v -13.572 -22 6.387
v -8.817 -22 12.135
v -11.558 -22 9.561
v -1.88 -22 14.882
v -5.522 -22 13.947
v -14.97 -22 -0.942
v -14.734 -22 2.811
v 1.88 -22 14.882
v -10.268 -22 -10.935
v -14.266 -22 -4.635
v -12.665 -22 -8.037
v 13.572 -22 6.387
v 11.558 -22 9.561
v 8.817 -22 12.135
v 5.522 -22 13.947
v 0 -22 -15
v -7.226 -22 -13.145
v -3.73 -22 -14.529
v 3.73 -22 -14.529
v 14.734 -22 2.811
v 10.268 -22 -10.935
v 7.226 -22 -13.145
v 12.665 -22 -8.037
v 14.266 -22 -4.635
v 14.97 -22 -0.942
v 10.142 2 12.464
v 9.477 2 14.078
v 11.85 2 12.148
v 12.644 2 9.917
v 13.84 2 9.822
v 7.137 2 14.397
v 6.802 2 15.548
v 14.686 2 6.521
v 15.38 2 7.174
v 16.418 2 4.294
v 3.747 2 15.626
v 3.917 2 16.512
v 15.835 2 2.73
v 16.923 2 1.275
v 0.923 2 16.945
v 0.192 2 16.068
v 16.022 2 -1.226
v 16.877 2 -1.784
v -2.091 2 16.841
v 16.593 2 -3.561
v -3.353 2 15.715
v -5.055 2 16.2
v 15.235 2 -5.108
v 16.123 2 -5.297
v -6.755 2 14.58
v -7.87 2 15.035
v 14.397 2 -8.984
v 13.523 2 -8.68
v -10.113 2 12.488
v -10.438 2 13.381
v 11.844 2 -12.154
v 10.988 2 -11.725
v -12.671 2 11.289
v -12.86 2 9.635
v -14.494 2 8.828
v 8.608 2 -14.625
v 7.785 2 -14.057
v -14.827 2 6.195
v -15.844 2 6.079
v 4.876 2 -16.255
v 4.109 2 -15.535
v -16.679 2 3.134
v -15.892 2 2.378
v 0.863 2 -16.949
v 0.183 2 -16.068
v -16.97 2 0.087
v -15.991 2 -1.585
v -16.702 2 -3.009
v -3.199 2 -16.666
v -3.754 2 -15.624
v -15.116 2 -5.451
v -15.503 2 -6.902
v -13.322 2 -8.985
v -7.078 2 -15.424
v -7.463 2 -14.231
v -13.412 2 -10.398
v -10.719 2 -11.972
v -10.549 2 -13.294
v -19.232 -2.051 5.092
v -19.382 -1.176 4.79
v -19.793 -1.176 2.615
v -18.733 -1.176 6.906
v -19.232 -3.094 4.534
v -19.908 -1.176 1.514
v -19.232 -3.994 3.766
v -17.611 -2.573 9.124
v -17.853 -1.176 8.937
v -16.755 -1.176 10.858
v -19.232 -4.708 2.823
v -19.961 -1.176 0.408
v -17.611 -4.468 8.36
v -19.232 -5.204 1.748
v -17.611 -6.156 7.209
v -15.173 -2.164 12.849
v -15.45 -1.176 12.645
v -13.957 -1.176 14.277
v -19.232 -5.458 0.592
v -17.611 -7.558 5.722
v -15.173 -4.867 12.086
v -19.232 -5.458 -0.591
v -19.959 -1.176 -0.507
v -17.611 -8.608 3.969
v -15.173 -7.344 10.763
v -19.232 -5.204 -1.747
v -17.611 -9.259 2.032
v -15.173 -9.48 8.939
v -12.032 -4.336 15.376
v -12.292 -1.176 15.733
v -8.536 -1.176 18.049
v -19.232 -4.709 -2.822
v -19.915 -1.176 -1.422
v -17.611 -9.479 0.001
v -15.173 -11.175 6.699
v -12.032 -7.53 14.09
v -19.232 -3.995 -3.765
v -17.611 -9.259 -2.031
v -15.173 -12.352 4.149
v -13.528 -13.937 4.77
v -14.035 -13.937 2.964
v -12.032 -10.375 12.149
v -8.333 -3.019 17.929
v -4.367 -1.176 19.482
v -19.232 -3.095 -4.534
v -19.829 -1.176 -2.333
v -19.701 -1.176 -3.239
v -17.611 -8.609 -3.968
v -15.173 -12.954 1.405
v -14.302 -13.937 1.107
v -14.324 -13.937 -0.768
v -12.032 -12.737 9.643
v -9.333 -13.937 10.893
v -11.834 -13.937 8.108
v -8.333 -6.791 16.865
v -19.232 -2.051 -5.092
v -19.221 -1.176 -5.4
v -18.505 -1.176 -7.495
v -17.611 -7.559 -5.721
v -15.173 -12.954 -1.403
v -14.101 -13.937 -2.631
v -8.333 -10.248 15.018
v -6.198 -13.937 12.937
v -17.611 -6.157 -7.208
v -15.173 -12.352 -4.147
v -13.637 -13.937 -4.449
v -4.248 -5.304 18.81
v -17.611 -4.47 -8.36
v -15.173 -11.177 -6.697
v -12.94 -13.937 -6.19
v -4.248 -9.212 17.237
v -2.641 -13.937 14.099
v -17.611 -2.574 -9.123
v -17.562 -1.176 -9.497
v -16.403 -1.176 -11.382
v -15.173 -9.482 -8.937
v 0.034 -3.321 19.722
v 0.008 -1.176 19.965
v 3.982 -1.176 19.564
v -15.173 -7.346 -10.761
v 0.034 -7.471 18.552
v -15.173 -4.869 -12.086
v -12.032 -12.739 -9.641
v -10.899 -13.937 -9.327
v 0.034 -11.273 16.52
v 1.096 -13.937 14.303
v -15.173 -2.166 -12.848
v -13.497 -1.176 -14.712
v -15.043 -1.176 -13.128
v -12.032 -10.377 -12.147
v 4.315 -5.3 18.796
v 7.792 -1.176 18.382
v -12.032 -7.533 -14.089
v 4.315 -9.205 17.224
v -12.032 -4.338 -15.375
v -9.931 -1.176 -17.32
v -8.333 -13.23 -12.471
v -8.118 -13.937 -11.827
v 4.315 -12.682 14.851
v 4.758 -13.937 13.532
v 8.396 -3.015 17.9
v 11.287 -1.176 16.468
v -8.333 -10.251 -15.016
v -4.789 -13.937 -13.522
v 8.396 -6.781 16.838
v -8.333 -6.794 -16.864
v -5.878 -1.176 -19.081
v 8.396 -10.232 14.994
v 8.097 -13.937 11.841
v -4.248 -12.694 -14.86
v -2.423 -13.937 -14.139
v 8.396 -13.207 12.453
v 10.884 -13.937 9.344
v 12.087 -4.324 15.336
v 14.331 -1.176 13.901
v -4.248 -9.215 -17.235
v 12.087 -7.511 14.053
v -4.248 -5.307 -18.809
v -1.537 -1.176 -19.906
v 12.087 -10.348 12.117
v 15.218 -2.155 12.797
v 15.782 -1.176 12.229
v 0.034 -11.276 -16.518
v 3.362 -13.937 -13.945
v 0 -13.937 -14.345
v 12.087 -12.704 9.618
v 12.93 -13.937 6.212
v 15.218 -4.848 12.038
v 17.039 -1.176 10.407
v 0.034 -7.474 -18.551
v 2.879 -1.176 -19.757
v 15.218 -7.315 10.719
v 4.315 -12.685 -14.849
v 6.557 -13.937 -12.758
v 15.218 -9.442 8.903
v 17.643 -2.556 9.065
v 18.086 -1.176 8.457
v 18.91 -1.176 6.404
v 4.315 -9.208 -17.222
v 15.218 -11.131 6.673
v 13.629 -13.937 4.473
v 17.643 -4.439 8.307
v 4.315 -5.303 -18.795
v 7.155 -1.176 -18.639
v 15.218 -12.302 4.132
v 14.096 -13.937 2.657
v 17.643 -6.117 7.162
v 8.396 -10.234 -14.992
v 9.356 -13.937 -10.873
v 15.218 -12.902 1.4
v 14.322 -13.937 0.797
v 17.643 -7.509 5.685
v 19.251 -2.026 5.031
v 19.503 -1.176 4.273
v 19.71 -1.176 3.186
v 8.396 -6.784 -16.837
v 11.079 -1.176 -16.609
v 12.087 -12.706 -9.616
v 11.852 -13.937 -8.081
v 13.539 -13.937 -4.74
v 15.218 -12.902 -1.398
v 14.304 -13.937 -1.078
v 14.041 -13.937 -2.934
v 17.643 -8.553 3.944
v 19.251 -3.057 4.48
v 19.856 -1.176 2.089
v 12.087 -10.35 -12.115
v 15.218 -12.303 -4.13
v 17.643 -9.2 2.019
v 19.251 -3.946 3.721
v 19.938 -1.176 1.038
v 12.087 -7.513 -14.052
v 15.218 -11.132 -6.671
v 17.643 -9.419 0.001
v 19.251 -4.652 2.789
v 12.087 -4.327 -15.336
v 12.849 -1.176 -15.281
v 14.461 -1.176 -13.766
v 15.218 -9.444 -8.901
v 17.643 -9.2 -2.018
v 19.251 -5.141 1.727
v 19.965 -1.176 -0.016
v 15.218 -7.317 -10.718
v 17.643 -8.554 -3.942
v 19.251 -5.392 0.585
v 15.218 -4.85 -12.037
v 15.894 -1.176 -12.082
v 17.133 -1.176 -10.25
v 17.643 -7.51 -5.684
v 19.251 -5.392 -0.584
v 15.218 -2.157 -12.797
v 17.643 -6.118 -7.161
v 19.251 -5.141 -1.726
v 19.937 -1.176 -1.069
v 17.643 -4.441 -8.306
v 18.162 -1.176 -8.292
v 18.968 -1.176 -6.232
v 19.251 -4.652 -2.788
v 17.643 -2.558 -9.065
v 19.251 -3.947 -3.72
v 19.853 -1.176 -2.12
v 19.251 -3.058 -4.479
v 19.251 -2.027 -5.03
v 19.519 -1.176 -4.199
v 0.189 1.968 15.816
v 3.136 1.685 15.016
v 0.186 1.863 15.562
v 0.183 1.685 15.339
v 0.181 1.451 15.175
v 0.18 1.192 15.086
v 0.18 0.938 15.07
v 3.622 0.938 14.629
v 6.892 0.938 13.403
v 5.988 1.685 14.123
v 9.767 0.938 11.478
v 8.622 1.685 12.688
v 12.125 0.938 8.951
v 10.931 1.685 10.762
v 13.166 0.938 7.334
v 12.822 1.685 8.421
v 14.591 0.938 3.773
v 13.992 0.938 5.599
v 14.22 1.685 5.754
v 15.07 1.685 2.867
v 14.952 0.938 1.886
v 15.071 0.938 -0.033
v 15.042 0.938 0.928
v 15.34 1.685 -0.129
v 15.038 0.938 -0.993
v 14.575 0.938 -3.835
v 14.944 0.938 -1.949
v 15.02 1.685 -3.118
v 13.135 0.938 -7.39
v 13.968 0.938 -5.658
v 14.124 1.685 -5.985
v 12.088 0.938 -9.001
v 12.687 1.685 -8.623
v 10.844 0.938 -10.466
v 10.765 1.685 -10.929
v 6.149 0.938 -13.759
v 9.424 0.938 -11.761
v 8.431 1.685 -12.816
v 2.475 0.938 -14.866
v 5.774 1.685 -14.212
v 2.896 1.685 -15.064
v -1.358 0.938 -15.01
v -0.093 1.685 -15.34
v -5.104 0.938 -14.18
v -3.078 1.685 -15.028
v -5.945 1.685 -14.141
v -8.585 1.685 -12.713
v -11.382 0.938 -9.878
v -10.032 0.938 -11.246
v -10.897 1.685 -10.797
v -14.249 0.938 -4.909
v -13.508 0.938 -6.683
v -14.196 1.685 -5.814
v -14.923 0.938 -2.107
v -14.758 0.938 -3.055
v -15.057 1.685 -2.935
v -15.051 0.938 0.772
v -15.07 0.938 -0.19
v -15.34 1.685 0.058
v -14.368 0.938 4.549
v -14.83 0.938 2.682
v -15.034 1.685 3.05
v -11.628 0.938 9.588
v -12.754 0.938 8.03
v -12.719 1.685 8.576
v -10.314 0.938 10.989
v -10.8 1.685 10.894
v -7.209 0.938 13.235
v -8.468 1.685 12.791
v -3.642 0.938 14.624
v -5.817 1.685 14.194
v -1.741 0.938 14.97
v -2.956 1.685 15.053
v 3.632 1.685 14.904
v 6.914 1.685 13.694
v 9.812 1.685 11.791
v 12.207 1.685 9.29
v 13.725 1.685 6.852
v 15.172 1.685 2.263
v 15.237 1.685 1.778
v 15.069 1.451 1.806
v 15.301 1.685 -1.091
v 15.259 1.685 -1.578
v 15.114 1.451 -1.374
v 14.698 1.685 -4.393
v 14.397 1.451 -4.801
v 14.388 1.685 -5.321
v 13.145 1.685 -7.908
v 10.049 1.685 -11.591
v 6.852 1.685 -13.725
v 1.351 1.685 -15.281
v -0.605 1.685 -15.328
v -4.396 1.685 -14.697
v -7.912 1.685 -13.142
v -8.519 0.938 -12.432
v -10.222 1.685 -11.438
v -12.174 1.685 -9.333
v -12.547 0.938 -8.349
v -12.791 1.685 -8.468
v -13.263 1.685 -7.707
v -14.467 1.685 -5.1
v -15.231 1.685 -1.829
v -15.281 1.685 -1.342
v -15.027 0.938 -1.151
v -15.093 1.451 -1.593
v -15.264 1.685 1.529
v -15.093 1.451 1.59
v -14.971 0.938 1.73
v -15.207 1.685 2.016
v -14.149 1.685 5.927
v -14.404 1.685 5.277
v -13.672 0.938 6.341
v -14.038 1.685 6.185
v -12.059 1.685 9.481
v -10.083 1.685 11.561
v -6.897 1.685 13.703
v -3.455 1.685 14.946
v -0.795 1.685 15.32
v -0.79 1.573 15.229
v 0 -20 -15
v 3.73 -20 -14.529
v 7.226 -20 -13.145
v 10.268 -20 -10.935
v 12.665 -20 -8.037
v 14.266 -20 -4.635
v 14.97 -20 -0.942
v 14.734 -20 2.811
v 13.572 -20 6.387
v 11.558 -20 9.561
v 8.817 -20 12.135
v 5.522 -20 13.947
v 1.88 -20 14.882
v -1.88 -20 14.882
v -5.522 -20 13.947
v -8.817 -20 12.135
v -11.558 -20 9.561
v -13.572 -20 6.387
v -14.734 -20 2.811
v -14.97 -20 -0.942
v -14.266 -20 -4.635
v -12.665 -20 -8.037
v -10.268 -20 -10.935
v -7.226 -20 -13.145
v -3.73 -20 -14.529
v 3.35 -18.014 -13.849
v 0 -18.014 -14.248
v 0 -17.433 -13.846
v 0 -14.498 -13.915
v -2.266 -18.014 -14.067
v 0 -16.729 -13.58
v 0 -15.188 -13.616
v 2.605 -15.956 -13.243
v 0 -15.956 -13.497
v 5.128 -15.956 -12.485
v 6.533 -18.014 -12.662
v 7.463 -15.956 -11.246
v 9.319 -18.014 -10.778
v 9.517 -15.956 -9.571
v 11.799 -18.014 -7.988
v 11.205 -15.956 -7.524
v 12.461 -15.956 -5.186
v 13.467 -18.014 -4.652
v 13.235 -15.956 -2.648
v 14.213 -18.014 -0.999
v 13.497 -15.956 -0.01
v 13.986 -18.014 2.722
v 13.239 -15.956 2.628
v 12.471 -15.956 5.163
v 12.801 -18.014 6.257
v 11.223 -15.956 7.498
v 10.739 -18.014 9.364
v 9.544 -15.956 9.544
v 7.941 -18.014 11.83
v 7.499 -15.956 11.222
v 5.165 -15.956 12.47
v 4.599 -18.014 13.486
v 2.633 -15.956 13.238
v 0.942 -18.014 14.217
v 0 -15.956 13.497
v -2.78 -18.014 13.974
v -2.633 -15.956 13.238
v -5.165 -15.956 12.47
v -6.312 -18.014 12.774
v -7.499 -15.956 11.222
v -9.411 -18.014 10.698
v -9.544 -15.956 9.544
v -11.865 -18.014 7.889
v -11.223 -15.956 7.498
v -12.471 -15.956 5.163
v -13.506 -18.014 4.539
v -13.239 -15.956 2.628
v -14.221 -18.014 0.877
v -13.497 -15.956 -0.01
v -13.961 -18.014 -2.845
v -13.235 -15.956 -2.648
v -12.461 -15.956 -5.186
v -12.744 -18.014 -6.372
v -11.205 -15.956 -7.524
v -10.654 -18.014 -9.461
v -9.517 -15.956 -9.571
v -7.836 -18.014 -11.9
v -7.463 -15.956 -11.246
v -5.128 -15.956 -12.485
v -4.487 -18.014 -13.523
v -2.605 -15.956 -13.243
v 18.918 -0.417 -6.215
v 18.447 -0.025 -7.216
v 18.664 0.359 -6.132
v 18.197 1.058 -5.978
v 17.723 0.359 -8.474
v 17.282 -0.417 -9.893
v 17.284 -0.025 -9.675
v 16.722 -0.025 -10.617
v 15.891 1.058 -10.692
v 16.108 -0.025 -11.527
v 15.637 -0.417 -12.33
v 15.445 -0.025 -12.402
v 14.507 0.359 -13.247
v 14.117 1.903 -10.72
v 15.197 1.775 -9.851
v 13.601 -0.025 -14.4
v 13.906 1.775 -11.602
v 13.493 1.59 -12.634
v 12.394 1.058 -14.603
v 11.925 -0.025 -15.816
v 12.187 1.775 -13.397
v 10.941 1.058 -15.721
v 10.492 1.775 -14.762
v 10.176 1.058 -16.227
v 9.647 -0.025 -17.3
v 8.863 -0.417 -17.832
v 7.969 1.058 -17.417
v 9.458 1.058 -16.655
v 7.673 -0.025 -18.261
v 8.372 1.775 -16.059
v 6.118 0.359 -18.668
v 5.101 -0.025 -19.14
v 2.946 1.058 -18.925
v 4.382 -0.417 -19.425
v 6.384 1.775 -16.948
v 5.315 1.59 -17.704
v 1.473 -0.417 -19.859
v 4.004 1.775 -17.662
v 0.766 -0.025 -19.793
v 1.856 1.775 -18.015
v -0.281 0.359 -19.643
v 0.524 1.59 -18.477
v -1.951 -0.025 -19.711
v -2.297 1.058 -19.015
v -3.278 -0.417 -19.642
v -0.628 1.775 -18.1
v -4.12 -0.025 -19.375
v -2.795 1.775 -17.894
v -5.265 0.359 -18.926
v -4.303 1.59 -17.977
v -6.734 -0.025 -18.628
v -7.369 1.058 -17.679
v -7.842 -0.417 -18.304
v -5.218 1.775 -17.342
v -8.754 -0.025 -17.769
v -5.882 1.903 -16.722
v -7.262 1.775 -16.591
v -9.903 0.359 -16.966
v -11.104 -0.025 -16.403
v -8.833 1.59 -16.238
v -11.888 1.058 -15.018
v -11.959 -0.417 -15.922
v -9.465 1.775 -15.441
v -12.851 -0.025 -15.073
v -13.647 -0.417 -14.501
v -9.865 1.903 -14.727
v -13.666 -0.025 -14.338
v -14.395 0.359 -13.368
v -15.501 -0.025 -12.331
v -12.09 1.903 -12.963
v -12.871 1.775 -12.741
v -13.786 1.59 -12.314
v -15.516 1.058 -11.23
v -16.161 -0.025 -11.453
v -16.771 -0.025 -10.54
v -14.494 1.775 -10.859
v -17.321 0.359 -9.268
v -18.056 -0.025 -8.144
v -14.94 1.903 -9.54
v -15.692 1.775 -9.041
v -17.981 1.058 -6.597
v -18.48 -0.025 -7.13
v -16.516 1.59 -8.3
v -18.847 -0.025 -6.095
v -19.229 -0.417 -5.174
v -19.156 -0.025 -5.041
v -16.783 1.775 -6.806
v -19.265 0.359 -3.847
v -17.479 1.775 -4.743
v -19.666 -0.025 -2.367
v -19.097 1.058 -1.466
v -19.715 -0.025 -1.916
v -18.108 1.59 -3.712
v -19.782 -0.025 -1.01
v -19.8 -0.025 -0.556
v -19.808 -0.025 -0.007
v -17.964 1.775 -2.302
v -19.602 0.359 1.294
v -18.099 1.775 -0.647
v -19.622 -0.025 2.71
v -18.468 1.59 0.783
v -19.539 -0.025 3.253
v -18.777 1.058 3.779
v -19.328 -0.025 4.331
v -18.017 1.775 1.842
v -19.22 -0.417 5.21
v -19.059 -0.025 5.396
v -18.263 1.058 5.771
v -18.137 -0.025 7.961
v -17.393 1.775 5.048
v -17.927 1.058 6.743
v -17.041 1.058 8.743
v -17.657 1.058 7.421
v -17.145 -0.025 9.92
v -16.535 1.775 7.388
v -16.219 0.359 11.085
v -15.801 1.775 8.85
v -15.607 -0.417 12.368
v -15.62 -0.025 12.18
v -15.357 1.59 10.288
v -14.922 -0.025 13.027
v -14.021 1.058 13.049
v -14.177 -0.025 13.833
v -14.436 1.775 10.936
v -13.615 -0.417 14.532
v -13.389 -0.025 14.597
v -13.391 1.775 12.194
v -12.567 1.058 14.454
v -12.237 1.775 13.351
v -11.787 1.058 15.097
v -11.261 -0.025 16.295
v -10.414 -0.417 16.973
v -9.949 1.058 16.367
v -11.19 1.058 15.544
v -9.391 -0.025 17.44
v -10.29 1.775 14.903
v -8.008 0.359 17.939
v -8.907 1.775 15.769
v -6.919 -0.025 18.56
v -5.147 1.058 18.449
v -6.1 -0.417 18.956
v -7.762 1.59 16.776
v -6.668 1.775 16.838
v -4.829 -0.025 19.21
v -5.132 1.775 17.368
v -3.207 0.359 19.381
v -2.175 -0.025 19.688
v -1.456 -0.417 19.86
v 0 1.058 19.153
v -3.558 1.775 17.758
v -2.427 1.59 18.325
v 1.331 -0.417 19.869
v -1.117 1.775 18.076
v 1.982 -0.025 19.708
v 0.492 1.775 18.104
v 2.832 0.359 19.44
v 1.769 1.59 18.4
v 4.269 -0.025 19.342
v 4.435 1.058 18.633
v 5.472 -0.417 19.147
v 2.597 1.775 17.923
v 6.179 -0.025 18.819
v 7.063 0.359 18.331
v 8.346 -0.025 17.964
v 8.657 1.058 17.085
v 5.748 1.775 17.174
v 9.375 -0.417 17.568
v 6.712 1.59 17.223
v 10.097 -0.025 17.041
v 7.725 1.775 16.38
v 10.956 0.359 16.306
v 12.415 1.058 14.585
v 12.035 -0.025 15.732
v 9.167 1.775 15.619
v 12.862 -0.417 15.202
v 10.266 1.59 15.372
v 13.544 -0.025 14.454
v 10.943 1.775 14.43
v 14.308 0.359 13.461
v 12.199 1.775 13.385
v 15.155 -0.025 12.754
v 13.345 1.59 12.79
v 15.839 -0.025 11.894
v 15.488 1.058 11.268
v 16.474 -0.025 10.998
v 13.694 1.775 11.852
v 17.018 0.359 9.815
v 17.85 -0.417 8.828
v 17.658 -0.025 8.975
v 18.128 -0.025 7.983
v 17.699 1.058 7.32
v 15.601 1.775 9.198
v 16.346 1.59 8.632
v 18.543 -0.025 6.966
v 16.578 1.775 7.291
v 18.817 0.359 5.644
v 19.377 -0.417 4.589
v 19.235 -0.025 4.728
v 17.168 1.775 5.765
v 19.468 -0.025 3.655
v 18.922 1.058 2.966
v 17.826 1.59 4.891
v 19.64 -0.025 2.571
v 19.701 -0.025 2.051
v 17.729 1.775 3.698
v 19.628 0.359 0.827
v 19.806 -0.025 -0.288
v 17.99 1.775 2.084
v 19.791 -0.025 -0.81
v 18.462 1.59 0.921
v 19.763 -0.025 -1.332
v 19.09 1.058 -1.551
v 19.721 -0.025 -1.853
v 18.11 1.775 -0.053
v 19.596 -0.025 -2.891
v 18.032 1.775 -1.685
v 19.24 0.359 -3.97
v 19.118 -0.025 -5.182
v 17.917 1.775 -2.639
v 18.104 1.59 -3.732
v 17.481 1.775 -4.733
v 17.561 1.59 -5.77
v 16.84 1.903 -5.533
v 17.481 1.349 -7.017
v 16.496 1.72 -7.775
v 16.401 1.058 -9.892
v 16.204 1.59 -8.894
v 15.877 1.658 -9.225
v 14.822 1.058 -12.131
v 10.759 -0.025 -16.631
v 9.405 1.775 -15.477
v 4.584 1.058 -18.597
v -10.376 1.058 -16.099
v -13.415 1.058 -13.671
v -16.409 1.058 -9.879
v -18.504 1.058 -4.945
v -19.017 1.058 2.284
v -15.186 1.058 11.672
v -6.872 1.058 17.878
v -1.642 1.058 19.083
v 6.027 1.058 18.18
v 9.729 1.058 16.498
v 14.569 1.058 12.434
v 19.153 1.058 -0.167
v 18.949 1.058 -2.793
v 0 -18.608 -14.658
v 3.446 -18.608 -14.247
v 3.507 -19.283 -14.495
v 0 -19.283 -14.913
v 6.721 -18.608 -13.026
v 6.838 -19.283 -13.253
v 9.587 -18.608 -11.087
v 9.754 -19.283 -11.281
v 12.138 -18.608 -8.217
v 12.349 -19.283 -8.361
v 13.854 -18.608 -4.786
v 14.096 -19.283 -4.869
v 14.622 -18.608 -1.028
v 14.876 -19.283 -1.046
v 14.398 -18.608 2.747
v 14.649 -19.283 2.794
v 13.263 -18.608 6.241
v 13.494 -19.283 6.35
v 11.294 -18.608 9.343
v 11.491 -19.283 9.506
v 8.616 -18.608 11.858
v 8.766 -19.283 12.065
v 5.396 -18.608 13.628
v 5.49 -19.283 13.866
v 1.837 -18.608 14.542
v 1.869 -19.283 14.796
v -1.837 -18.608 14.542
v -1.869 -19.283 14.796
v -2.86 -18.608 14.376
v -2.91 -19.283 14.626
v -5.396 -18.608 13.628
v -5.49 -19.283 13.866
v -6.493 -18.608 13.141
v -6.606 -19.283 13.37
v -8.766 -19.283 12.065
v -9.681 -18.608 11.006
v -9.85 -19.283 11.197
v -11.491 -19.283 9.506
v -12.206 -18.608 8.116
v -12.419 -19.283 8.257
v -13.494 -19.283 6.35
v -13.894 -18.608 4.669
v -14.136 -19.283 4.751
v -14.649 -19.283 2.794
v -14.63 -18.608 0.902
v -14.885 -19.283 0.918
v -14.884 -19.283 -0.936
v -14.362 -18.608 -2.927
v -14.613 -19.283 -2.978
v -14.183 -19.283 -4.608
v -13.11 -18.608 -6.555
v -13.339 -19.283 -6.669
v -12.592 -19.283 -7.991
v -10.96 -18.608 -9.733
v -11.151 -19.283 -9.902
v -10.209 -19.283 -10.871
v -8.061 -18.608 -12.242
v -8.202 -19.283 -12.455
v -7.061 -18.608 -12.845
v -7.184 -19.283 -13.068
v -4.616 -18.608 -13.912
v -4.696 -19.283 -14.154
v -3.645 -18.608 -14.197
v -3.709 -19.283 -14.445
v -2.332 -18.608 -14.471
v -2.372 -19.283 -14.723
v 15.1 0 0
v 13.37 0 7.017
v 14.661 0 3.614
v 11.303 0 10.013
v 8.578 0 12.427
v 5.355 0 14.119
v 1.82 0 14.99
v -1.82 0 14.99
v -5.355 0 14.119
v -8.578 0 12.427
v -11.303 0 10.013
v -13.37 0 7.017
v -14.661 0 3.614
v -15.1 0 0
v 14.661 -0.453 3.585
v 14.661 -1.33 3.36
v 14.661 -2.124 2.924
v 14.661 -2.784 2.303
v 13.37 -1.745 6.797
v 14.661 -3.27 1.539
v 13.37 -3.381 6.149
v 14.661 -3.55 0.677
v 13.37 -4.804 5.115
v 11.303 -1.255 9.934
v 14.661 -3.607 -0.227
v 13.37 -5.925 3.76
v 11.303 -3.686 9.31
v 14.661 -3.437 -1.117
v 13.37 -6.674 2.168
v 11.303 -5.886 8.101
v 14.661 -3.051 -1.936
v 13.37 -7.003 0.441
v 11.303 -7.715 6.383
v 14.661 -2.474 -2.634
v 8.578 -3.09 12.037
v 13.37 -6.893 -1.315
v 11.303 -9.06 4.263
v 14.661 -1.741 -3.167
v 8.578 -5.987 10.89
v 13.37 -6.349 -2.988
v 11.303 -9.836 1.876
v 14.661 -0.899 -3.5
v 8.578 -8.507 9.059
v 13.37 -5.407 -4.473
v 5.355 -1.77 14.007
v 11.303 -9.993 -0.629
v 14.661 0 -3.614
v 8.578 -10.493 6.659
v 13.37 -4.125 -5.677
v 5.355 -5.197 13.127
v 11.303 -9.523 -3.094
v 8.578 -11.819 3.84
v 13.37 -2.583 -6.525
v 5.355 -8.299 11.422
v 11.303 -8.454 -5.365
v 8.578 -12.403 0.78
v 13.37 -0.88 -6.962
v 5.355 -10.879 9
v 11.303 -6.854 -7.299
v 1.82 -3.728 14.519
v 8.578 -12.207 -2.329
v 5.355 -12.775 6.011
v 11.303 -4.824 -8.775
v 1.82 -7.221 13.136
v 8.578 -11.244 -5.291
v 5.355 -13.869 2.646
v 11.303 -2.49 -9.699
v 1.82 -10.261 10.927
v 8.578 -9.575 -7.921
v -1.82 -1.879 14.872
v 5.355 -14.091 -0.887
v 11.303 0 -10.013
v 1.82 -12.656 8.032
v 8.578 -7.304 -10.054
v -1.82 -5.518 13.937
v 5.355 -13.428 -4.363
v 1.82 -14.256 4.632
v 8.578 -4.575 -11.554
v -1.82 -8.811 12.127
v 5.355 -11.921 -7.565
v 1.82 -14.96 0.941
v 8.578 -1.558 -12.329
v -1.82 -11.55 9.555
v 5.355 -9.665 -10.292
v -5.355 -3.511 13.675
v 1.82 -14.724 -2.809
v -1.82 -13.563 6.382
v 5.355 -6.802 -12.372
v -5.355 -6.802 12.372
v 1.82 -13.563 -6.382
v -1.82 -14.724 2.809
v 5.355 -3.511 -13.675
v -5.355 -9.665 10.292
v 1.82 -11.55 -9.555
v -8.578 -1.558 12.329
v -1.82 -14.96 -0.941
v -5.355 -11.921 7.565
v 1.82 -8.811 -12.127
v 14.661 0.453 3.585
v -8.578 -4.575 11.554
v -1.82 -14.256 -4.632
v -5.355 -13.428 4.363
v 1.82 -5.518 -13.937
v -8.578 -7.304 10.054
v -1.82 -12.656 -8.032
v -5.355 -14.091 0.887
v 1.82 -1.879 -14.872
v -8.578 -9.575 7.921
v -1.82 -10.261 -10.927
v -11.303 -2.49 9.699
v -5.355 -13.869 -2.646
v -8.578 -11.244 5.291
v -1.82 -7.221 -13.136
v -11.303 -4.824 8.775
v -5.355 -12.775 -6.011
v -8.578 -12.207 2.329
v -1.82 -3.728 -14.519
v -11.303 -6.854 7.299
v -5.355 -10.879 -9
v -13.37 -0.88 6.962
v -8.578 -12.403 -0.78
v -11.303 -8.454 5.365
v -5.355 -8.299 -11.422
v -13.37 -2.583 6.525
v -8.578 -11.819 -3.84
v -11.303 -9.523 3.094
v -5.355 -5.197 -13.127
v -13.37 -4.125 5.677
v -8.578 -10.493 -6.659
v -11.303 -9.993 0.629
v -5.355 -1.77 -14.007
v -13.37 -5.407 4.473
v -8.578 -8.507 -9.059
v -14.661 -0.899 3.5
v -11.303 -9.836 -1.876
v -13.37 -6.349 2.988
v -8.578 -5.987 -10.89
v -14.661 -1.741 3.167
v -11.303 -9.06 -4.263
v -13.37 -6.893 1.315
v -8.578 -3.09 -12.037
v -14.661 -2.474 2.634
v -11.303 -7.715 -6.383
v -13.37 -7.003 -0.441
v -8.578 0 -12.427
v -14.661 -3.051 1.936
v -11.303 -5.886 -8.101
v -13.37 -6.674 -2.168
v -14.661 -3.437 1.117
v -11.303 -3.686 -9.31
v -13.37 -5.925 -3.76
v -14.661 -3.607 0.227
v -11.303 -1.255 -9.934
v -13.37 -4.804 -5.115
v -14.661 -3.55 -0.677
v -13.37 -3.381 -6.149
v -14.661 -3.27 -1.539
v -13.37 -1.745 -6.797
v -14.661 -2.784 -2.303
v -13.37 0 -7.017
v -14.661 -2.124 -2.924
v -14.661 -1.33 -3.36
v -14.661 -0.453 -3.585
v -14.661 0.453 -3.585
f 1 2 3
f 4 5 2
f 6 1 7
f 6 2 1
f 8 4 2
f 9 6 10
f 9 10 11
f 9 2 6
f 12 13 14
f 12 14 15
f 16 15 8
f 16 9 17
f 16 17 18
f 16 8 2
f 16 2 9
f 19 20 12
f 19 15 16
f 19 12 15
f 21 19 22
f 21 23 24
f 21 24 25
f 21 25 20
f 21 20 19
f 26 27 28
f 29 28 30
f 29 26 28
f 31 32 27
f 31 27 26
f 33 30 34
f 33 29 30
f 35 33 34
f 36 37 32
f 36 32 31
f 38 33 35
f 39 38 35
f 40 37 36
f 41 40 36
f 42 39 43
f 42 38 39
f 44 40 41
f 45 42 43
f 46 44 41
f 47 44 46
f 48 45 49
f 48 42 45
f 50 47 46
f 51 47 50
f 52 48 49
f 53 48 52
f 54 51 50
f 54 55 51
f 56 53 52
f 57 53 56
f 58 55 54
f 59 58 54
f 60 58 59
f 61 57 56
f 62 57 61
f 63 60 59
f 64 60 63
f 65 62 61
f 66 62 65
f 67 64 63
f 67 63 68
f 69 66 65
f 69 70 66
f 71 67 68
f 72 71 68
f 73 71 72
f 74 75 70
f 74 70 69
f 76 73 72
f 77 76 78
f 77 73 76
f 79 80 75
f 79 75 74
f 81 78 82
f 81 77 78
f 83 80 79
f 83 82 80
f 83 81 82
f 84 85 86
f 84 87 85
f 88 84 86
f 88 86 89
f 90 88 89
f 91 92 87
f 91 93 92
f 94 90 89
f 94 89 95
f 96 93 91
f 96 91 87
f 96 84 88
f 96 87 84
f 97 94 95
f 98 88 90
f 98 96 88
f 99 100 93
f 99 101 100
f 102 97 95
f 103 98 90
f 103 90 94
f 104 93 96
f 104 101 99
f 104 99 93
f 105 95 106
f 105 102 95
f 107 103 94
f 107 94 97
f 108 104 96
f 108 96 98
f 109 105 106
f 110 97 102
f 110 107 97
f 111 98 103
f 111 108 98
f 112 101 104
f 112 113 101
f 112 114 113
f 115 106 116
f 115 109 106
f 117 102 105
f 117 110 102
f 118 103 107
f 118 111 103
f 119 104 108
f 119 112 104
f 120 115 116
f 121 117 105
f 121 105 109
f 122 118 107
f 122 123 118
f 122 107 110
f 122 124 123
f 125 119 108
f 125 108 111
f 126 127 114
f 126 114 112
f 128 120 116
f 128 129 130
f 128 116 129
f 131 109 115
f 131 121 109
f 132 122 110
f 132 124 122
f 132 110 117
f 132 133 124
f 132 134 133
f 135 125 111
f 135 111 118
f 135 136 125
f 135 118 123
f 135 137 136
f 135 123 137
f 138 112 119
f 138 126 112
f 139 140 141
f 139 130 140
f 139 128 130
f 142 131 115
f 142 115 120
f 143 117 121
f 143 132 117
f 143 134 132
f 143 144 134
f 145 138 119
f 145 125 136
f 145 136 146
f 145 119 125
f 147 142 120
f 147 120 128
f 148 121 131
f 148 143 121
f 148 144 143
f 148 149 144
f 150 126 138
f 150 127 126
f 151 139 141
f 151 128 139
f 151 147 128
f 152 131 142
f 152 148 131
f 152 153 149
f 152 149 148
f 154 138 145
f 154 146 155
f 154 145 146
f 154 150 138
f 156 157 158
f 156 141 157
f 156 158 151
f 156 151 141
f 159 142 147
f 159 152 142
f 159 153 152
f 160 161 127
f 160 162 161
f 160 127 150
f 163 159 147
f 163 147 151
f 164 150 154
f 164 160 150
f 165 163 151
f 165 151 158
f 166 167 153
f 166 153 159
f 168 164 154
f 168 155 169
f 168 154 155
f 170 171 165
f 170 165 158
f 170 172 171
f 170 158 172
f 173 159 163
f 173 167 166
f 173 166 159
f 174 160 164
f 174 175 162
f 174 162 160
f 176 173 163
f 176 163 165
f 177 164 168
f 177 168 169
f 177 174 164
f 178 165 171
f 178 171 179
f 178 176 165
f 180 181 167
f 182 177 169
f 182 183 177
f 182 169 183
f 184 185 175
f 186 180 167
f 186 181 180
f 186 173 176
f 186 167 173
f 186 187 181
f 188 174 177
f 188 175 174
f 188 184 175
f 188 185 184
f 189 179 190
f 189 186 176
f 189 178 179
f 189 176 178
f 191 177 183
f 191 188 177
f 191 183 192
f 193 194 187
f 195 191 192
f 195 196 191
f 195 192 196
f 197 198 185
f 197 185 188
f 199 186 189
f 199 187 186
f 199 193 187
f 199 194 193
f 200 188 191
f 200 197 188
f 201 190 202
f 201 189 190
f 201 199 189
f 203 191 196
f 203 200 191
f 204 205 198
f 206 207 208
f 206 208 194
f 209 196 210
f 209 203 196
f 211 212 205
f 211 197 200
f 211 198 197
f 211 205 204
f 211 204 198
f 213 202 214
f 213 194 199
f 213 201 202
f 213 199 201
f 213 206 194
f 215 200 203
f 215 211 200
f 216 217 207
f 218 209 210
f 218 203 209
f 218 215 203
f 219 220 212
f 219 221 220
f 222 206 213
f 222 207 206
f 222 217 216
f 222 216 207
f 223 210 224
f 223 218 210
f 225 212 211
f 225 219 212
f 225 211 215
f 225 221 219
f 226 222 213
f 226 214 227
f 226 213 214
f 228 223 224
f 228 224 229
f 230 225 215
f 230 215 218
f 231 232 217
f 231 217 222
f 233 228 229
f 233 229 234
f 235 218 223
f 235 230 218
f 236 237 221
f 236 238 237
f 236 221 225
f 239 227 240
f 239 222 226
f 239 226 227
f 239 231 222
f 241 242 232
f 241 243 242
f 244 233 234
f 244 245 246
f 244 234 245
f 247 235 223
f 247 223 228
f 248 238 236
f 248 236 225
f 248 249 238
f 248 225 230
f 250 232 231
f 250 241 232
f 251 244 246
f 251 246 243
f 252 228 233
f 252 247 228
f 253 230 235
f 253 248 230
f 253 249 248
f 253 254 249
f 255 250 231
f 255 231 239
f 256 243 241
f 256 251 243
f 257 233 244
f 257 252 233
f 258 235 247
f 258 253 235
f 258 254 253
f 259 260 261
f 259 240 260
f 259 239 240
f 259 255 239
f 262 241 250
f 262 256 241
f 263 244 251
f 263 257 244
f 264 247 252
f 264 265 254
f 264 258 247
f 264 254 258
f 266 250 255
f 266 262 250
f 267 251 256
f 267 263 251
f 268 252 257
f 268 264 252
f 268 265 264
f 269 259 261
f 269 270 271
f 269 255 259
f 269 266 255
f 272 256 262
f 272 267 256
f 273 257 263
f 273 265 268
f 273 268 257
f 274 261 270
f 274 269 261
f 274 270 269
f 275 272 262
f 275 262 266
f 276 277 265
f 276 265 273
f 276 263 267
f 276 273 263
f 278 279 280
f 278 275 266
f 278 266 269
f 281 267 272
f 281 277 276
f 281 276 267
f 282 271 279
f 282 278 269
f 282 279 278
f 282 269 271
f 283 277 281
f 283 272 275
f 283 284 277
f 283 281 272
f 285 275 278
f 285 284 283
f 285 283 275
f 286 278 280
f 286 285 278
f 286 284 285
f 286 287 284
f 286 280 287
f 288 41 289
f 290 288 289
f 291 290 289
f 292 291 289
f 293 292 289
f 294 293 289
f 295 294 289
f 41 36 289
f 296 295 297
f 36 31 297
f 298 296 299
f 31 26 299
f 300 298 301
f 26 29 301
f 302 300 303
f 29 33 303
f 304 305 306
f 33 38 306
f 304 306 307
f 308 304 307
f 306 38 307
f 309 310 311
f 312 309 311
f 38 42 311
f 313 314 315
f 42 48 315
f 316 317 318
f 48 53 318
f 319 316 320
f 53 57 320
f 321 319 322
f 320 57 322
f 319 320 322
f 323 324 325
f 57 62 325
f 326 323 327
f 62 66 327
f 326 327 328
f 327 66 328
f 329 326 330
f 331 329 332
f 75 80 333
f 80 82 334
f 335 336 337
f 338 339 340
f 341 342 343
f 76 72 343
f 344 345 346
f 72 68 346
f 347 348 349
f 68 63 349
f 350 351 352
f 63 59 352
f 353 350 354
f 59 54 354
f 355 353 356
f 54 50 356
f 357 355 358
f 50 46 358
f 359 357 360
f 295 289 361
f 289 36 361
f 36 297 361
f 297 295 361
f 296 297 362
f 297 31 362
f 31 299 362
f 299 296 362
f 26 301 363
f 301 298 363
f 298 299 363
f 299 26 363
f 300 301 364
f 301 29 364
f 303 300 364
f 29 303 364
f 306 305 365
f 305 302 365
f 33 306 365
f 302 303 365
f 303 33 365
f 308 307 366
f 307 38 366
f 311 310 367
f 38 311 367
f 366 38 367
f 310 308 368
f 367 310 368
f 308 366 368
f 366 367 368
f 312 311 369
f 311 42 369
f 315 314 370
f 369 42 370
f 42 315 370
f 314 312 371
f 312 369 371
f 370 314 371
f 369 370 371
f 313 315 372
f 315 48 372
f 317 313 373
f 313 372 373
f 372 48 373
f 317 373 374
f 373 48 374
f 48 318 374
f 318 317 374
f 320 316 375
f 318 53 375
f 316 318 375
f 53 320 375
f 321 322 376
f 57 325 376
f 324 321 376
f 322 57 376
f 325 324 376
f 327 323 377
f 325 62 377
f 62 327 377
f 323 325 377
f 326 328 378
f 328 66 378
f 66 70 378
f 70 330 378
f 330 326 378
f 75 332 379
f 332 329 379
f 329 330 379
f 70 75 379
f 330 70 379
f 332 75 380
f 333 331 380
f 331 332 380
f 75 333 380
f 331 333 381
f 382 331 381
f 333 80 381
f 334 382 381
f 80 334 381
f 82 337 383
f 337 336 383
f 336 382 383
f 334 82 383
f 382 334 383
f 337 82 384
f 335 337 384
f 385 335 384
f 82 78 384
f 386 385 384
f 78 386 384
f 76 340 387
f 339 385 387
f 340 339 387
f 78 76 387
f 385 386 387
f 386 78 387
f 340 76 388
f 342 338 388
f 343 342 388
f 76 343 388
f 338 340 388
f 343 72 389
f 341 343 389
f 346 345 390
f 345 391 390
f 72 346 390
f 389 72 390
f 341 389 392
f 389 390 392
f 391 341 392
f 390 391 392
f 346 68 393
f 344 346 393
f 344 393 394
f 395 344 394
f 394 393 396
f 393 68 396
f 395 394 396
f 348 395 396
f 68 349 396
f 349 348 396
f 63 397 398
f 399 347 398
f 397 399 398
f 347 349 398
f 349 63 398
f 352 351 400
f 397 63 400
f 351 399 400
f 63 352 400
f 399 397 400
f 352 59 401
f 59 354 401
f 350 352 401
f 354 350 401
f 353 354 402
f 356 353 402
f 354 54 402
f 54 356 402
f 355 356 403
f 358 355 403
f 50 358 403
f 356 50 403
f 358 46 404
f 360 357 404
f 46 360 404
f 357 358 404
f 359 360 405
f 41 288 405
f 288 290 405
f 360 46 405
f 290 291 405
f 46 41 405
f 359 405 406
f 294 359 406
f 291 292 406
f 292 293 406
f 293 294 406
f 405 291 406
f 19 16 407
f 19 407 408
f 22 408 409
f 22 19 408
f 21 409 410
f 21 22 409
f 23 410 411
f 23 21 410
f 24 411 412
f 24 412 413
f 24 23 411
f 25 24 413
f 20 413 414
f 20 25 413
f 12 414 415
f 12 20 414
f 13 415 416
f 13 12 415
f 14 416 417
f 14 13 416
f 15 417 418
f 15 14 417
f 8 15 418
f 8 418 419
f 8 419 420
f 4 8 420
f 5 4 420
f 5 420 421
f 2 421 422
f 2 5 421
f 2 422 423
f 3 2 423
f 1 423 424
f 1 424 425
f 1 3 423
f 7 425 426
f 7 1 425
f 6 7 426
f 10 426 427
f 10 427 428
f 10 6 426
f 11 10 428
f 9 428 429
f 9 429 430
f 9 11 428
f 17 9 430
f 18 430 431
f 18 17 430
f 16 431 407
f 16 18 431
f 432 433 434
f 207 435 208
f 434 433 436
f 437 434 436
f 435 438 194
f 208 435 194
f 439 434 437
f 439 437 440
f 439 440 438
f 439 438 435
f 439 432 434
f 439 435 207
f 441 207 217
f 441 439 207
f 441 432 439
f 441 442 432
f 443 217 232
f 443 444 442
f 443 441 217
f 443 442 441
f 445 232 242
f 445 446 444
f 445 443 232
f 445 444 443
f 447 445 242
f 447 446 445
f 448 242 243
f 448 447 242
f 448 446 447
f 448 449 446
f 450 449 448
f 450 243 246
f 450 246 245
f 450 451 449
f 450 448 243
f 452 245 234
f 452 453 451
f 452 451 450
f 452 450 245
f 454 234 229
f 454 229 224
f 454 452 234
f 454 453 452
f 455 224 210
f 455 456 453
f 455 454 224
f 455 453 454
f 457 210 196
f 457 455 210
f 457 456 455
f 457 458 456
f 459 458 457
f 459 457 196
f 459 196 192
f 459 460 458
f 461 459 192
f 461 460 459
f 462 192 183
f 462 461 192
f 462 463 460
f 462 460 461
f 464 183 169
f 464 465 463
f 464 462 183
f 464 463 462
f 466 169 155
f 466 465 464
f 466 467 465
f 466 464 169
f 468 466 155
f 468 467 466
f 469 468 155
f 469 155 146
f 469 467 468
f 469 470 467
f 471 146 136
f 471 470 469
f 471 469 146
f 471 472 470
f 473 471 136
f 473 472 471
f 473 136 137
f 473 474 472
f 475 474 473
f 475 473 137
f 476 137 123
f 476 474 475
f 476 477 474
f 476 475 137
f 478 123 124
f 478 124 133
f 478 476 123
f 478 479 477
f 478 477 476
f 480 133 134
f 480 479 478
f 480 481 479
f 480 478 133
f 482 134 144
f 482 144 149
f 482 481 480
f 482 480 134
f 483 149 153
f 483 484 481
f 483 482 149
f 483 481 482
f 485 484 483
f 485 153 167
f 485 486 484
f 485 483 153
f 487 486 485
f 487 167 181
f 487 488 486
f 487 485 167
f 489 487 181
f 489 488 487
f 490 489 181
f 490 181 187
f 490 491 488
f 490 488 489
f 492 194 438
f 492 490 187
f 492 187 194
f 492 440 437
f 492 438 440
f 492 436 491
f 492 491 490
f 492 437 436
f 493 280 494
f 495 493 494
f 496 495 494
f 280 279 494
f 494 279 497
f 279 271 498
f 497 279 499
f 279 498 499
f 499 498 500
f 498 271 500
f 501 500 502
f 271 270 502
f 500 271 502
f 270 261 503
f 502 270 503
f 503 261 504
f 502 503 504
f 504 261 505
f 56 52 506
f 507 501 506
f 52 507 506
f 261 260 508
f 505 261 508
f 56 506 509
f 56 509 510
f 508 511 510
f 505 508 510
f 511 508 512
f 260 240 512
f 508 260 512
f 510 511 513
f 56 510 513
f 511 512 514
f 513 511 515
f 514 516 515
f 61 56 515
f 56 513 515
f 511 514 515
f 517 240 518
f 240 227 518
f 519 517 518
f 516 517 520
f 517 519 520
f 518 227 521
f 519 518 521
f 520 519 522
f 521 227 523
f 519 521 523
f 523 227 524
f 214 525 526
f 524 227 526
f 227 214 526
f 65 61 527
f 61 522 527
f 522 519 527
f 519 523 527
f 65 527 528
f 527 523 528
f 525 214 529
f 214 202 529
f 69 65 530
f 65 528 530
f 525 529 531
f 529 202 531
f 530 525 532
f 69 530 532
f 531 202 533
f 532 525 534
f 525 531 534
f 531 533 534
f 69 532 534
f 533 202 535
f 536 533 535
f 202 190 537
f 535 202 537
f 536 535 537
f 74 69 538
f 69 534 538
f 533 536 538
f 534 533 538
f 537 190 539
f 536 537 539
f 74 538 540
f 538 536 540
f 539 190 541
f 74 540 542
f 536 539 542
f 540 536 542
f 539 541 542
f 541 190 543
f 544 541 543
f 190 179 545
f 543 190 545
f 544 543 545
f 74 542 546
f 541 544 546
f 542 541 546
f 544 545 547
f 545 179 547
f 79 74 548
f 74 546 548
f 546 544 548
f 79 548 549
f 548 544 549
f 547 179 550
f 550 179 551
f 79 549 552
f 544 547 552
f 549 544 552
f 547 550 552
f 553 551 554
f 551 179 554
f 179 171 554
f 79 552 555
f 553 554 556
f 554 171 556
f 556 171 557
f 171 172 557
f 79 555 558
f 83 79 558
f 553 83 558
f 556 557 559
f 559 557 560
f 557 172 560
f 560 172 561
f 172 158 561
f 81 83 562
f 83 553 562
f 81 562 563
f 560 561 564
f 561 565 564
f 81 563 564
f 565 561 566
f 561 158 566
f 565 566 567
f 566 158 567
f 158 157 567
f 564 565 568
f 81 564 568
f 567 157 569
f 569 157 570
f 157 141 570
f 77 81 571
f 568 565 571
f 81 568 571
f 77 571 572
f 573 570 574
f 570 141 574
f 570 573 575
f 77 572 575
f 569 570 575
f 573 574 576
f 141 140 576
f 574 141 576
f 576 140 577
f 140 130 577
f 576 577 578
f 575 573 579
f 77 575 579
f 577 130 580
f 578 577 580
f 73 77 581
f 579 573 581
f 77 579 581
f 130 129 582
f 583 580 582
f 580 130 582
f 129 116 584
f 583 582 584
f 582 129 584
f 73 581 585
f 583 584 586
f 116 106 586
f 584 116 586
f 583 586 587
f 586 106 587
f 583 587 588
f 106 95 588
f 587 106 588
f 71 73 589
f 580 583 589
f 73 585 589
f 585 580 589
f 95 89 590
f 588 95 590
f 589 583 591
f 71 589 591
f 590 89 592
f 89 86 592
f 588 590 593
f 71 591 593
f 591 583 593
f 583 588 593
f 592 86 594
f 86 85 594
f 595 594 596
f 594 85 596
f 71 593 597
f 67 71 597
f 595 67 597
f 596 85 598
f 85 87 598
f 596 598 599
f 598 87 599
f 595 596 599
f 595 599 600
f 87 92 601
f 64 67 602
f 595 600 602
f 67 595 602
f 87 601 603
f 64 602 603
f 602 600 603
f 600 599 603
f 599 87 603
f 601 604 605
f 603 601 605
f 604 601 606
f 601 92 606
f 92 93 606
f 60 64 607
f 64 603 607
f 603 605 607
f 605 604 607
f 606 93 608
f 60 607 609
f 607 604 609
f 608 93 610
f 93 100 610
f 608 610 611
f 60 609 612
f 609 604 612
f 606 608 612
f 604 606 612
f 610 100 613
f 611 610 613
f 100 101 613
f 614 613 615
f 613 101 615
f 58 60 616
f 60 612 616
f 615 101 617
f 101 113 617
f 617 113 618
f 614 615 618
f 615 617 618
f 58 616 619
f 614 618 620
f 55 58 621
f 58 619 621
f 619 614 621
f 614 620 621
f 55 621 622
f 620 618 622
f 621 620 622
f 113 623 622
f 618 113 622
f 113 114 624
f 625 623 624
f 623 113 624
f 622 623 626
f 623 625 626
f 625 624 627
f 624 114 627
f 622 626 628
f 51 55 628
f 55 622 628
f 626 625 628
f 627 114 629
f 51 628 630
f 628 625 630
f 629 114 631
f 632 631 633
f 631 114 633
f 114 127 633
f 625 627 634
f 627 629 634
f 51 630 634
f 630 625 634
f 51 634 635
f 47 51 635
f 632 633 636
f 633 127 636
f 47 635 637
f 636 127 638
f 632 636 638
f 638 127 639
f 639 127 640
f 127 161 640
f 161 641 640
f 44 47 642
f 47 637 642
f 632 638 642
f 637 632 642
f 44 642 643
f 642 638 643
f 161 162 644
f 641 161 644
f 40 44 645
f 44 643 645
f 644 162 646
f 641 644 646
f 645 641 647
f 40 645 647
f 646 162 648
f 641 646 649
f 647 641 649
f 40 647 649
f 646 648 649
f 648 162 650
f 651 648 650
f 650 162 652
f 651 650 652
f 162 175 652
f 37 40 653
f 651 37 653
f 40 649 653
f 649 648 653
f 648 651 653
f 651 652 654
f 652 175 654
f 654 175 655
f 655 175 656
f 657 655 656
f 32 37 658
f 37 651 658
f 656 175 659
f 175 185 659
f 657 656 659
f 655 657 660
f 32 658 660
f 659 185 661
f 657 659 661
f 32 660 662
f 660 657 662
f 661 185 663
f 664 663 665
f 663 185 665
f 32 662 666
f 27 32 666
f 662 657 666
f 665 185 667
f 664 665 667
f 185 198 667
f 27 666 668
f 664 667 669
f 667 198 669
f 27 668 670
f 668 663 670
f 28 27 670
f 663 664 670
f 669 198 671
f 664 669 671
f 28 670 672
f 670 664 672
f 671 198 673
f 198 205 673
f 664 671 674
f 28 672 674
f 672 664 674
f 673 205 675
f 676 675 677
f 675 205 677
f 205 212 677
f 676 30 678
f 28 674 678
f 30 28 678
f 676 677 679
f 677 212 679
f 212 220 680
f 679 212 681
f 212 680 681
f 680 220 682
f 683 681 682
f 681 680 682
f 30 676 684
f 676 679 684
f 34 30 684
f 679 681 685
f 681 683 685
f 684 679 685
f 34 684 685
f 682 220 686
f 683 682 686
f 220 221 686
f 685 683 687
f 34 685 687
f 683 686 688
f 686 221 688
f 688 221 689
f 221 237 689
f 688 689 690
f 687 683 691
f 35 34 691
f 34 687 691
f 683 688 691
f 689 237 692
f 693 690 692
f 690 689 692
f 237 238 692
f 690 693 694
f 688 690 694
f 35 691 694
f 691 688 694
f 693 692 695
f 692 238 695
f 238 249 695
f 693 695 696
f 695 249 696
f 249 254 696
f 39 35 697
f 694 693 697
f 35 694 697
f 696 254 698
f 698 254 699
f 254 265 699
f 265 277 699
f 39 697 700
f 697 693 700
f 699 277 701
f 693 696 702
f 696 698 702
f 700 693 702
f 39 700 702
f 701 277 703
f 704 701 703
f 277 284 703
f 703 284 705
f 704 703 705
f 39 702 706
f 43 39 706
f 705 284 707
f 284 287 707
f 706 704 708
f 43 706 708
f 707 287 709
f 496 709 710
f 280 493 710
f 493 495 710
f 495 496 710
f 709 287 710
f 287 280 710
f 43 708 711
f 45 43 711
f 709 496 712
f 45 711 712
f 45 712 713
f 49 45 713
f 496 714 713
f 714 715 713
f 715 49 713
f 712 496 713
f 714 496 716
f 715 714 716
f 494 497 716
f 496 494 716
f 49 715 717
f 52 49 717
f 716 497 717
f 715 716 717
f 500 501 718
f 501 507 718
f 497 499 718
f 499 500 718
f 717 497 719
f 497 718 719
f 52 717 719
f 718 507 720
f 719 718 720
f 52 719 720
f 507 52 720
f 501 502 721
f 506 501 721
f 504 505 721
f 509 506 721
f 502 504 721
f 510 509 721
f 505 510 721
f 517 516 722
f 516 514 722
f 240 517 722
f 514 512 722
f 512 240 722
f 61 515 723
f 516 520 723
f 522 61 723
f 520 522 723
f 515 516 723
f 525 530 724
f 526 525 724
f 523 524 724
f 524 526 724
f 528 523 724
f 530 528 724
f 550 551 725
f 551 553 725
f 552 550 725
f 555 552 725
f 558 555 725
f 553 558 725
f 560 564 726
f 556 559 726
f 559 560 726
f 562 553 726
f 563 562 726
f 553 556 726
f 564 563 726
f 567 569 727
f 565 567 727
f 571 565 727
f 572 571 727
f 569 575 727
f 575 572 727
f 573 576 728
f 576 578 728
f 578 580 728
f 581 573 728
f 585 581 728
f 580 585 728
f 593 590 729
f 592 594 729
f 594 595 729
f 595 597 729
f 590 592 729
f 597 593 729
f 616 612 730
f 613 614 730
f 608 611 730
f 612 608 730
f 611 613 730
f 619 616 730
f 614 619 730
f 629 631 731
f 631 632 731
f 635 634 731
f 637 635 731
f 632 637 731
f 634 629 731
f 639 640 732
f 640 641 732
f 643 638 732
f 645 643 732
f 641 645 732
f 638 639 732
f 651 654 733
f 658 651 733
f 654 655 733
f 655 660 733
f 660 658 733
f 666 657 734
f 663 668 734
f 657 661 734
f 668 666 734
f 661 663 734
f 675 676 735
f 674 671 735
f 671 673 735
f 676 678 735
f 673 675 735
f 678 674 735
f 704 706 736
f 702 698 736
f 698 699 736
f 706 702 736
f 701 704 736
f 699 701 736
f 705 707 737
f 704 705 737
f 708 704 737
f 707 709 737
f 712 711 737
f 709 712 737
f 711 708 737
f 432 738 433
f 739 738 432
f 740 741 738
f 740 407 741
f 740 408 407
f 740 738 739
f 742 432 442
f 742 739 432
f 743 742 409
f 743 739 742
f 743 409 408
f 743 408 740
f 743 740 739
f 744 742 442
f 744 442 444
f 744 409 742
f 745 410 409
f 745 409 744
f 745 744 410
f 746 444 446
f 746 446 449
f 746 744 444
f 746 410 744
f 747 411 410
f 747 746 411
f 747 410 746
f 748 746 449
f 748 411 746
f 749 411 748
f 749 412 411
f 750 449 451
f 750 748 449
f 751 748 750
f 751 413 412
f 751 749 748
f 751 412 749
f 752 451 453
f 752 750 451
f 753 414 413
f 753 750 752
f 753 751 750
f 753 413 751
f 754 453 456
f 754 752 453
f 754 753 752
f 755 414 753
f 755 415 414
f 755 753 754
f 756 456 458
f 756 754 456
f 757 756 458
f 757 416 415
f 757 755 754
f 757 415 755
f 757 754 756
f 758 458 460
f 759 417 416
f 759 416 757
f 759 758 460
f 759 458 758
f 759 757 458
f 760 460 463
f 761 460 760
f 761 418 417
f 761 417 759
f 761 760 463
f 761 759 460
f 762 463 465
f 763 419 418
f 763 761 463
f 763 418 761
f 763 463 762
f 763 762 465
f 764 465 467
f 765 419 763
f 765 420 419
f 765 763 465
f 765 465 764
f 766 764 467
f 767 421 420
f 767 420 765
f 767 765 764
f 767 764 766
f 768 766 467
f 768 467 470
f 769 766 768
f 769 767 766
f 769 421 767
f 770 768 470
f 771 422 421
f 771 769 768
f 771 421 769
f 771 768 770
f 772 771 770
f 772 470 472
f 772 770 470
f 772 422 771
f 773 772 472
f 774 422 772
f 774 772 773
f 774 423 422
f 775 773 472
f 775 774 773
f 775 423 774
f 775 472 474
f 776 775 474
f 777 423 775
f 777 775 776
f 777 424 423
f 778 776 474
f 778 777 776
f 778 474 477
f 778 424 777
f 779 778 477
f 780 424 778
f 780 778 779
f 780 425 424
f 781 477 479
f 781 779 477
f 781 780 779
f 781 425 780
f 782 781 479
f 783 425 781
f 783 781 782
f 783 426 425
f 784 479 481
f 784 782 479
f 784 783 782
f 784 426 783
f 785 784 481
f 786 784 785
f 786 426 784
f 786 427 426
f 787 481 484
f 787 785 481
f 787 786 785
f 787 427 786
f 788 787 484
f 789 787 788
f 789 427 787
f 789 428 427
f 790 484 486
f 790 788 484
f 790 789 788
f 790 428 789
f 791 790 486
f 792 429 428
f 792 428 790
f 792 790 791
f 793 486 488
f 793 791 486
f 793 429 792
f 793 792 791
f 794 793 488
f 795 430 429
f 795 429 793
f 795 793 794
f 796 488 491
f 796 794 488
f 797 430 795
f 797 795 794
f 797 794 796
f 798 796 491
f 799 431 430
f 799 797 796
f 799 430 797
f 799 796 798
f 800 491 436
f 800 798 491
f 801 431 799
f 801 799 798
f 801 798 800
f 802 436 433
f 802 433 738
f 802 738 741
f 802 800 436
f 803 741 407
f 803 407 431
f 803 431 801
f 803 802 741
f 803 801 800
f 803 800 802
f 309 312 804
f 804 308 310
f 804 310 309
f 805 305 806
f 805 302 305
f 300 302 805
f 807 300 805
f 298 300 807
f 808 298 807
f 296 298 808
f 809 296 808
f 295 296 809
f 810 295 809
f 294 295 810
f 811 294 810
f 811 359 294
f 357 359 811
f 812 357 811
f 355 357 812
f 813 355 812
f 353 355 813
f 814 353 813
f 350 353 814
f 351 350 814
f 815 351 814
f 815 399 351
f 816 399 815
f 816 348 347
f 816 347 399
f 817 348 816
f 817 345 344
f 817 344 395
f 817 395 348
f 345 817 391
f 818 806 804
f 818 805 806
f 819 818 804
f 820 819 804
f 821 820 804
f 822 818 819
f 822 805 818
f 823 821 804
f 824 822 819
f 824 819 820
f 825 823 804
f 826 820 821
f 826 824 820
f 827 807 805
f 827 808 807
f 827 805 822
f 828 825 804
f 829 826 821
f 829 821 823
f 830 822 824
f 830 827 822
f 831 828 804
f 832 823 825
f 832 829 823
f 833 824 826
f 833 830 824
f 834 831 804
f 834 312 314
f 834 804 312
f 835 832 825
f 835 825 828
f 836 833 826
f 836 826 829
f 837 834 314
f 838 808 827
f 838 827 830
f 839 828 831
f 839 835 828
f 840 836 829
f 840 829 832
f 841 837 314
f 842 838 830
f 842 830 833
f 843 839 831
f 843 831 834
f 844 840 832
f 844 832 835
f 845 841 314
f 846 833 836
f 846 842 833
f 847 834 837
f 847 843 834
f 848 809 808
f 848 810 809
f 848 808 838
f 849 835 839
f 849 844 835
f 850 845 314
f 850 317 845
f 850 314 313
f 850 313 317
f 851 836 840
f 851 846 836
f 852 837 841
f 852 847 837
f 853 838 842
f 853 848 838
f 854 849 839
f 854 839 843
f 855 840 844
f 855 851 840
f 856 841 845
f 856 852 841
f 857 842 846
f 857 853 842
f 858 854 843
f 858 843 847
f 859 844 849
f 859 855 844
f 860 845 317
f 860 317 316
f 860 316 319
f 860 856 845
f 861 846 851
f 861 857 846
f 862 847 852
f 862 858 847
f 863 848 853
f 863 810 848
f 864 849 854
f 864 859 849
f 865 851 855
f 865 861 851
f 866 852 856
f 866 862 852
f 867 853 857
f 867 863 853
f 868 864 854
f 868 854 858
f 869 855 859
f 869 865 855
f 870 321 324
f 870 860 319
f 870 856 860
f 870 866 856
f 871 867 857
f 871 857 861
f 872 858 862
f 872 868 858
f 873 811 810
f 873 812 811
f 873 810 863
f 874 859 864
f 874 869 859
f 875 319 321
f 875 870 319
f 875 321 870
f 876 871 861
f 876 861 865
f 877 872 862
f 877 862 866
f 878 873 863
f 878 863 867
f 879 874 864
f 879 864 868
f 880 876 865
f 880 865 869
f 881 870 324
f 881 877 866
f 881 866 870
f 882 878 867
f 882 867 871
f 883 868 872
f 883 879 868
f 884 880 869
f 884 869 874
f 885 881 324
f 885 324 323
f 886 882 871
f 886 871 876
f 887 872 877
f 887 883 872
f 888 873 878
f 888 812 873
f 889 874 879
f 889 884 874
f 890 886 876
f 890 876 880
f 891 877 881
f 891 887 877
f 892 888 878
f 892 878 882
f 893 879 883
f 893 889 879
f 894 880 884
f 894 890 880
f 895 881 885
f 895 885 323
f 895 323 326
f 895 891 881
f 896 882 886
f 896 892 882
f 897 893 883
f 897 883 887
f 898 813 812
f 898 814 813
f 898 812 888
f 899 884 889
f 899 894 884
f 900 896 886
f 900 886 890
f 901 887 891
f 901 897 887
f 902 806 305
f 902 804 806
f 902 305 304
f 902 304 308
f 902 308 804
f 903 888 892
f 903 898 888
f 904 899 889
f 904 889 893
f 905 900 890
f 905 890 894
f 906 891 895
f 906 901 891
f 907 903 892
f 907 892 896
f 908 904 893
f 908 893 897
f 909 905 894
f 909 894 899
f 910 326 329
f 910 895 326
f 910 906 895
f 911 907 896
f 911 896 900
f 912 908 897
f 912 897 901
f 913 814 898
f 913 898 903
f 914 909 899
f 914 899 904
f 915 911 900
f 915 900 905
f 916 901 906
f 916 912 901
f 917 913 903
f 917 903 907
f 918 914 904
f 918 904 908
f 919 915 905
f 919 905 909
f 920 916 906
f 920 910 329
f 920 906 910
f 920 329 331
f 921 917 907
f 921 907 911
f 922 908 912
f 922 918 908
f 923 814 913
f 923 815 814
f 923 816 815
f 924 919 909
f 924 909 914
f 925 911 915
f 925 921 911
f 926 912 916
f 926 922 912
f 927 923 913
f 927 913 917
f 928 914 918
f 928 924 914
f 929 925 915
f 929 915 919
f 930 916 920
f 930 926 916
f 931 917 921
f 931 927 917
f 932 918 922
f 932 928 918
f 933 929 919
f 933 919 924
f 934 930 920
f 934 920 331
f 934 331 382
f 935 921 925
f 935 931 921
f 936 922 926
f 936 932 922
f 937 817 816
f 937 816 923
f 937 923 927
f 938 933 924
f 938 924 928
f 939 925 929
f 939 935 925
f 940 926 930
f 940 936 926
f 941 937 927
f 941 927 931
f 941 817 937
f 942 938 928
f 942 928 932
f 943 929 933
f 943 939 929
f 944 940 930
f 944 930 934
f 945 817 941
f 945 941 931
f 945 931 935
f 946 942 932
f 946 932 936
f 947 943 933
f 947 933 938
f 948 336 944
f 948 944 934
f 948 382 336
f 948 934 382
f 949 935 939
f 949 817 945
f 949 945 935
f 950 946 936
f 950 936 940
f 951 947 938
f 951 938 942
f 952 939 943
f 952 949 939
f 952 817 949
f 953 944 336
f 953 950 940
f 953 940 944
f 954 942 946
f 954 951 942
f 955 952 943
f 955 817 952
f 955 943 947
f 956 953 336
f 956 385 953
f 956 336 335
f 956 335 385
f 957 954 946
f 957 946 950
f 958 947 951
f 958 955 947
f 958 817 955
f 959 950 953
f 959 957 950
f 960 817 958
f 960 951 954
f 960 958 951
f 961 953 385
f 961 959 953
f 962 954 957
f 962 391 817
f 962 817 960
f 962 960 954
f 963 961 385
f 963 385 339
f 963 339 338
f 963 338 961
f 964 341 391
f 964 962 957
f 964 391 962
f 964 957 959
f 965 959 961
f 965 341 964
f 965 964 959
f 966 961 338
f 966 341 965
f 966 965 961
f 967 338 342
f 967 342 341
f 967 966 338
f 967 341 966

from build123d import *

# Parameters (mm, degrees)
CUT_EXTRUDE_1_DEPTH      = 35.641016151
CUT_EXTRUDE_1_DEPTH_BACK = 35.641016151
SKETCH_2_W               = 73.47601024
SKETCH_2_H               = 33
FILLET_1_R               = 1
EXTRUDE_1_REACH          = 52.636
EXTRUDE_1_END_RADIUS     = 20
SKETCH_3_R               = 6
SKETCH_4_R               = 15
EXTRUDE_2_DEPTH          = 5
FILLET_3_R               = 3
FILLET_4_R               = 3
FILLET_5_R               = 3


with BuildPart() as part:
    # 草图1 → 旋转5 (revolve)
    with BuildSketch(Plane(origin=(0, 0, 0), x_dir=(1, 0, 0), z_dir=(0, 1, 0))):
        with BuildLine():
            Line((-15.1, 0), (-20, 0))
            ThreePointArc((-20, 0), (0, -20), (20, 0))
            Line((20, 0), (15.1, 0))
            ThreePointArc((15.1, 0), (0, -15.1), (-15.1, 0))
        make_face()
    revolve(axis=Axis((-24.083513492, 0, 0), (1, 0, 0)))

    # 草图2 → 切除-拉伸1 (cut, two sides: drawn at the far end of the back side and taken through both)
    with BuildSketch(Plane(origin=(0, 0, 0), x_dir=(0, 0, -1), z_dir=(1, 0, 0)).offset(-CUT_EXTRUDE_1_DEPTH_BACK)):
        with Locations((-0.442626568, 18.5)):
            Rectangle(SKETCH_2_W, SKETCH_2_H)
    extrude(amount=CUT_EXTRUDE_1_DEPTH + CUT_EXTRUDE_1_DEPTH_BACK, mode=Mode.SUBTRACT)

    # 圆角1
    fillet_1_edges = [part.edges().sort_by_distance(p)[0] for p in [
        (0, 2, 14.96696362),
    ]]
    fillet(fillet_1_edges, radius=FILLET_1_R)

    # 凸台-拉伸1: up to this sphere (the profile starts outside it)
    extrude_1_end = Location((0, 0, 0)) * Sphere(EXTRUDE_1_END_RADIUS, mode=Mode.PRIVATE)
    # 草图3 → 凸台-拉伸1 (add, up to the surface)
    with BuildSketch(Plane(origin=(0, -22, 0), x_dir=(1, 0, 0), z_dir=(0, 1, 0)), mode=Mode.PRIVATE) as extrude_1_sk1:
        with Locations(Location((0, 0, 0), (0, 0, 270))):
            Circle(SKETCH_3_R)
    extrude_1_tool1 = extrude(extrude_1_sk1.sketch, amount=EXTRUDE_1_REACH, mode=Mode.PRIVATE) - extrude_1_end
    add(extrude_1_tool1.solids().sort_by_distance((0, -22, 0))[0])

    # 草图4 → 凸台-拉伸2 (add)
    with BuildSketch(Plane(origin=(0, -22, 0), x_dir=(-1, 0, 0), z_dir=(0, -1, 0))):
        with Locations(Location((0, 0, 0), (0, 0, 90))):
            Circle(SKETCH_4_R)
    extrude(amount=-EXTRUDE_2_DEPTH)

    # 圆角3
    fillet_3_edges = [part.edges().sort_by_distance(p)[0] for p in [
        (0, 2, 19.899748742),
    ]]
    fillet(fillet_3_edges, radius=FILLET_3_R)

    # 圆角4
    fillet_4_edges = [part.edges().sort_by_distance(p)[0] for p in [
        (0, -17, 15),
    ]]
    fillet(fillet_4_edges, radius=FILLET_4_R)

    # 圆角5
    fillet_5_edges = [part.edges().sort_by_distance(p)[0] for p in [
        (0, -17, 10.535653753),
    ]]
    fillet(fillet_5_edges, radius=FILLET_5_R)


solid = part.part
